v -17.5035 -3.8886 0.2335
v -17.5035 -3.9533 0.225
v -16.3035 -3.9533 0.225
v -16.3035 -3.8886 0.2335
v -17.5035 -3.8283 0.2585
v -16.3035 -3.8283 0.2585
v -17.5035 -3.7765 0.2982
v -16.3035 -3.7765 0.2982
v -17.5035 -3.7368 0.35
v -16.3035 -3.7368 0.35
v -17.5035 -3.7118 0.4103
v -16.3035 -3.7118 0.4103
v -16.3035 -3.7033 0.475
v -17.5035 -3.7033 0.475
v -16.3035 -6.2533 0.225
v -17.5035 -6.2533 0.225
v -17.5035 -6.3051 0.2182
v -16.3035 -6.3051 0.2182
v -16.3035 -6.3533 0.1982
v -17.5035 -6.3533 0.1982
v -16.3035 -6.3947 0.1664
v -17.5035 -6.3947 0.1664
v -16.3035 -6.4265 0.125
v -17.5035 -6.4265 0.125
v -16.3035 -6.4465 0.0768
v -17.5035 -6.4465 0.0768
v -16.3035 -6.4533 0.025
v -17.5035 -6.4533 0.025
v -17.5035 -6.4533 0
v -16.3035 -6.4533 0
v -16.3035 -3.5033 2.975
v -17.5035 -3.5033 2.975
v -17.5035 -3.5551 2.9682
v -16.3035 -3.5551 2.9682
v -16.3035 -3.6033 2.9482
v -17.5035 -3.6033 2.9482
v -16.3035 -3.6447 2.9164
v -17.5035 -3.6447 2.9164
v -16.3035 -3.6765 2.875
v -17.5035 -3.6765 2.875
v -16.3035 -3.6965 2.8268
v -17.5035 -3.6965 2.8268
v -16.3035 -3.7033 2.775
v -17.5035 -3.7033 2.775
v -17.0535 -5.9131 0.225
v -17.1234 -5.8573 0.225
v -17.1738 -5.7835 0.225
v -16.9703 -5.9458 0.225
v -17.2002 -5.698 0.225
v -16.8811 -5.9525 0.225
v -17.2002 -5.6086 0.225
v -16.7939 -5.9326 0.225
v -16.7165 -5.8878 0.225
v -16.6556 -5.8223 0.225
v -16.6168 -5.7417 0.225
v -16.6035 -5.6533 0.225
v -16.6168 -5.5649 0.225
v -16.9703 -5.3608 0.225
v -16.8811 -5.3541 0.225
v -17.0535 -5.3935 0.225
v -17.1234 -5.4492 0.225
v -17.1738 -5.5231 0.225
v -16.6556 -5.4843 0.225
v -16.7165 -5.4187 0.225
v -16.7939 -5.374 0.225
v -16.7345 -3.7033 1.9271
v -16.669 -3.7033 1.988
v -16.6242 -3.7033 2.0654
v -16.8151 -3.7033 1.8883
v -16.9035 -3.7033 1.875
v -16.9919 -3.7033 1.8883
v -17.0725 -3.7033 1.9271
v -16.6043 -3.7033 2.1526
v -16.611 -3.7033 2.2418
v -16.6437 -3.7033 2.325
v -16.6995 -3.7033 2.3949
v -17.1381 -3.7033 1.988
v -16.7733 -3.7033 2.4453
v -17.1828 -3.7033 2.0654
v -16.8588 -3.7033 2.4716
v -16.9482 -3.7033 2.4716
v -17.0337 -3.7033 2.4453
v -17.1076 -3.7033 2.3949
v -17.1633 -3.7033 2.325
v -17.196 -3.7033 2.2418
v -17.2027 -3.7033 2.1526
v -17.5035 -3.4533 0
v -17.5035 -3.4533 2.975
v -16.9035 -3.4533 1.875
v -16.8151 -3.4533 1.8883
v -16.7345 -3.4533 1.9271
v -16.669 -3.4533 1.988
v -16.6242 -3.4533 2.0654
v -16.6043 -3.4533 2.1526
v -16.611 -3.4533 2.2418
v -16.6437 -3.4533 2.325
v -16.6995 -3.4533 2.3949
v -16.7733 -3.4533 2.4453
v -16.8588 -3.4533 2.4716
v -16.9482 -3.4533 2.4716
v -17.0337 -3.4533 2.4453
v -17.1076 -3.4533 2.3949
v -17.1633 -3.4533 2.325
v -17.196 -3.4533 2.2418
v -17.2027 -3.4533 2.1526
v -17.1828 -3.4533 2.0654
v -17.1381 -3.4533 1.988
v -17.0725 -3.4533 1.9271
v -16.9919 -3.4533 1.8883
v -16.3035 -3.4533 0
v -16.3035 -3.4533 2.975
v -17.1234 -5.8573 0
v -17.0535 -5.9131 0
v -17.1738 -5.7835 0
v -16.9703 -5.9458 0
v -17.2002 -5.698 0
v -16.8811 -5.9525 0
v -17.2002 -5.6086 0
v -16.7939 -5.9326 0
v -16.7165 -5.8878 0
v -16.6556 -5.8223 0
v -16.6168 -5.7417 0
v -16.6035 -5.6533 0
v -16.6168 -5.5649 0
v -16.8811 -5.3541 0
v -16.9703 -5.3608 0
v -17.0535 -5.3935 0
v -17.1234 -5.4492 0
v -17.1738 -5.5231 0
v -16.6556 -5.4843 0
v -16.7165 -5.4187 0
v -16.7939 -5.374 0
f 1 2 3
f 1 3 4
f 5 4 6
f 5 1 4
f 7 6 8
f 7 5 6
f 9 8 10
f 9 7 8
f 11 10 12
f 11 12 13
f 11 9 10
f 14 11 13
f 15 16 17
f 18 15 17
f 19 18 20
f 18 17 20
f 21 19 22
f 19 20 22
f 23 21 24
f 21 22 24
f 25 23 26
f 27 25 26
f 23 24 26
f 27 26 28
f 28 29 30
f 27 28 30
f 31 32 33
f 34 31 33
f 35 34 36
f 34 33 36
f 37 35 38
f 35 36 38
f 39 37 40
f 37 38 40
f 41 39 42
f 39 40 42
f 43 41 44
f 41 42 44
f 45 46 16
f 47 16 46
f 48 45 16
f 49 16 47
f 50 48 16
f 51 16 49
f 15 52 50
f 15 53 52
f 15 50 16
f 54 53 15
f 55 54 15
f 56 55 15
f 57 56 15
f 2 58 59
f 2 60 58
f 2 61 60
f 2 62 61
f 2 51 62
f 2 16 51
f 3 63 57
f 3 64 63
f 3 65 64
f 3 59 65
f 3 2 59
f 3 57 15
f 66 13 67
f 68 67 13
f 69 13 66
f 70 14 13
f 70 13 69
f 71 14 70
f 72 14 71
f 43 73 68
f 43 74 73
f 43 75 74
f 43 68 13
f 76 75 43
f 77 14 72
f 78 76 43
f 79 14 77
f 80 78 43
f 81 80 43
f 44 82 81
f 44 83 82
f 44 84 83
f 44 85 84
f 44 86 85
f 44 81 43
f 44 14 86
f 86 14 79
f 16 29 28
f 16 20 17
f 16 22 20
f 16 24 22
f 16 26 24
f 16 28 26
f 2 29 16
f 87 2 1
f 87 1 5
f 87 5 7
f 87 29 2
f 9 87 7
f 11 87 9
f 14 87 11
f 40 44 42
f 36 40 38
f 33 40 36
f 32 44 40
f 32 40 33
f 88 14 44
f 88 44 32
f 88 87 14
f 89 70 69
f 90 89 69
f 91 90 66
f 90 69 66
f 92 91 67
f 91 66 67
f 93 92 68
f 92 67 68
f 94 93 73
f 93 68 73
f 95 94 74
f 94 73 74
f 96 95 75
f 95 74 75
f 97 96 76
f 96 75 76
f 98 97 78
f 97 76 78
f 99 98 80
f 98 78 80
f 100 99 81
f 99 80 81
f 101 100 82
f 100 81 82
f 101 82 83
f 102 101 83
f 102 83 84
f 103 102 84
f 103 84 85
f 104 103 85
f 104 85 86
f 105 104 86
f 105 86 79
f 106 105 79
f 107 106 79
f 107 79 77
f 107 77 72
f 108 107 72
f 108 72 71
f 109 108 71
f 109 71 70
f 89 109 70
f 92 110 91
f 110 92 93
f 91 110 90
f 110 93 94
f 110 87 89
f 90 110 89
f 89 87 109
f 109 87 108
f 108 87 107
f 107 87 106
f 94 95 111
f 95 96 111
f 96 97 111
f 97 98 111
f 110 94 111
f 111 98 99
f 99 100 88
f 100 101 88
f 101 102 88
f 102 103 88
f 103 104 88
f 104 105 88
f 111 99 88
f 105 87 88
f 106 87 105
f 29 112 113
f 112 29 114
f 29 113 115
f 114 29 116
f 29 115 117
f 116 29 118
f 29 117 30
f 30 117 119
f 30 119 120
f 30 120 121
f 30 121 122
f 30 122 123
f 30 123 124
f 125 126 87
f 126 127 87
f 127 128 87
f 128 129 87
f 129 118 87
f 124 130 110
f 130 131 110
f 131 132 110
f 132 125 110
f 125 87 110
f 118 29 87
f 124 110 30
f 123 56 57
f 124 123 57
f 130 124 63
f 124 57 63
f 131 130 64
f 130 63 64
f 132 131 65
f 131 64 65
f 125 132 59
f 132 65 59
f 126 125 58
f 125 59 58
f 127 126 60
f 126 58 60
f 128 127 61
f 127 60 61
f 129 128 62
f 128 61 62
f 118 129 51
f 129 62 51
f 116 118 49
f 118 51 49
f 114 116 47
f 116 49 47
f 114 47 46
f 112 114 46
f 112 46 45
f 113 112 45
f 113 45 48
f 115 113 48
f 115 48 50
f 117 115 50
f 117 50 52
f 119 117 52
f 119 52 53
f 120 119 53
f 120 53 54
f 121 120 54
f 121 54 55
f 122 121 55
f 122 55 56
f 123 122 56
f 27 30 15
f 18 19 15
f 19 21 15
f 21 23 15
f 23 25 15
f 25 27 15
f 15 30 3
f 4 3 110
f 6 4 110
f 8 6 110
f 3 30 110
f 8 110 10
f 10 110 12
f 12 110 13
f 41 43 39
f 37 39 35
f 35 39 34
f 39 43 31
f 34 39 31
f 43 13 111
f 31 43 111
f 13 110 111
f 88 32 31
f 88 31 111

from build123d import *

# Parameters (mm, degrees)
ESBO_O1_W                = 1.2
ESBO_O1_H                = 3
RESSALTO_EXTRUS_O1_DEPTH = 0.225
ESBO_O2_W                = 2.75
ESBO_O2_H                = 0.25
RESSALTO_EXTRUS_O2_DEPTH = 1.2
RESSALTO_EXTRUS_O3_DEPTH = 1.2
CORTE_EXTRUS_O1_DEPTH    = 1.2
ESBO_O8_R                = 0.3
CORTE_EXTRUS_O2_DEPTH    = 1.2
ESBO_O9_R                = 0.3
CORTE_EXTRUS_O3_DEPTH    = 1.2


with BuildPart() as part:
    # Esboço1 → Ressalto-extrusão1 (new body)
    with BuildSketch(Plane.XY):
        with Locations((-16.903502085, -4.953296555)):
            Rectangle(ESBO_O1_W, ESBO_O1_H)
    extrude(amount=RESSALTO_EXTRUS_O1_DEPTH)

    # Esboço2 → Ressalto-extrusão2 (add)
    with BuildSketch(Plane.ZY.offset(17.503502085)):
        with Locations((1.6, -3.578296555)):
            Rectangle(ESBO_O2_W, ESBO_O2_H)
    extrude(amount=-RESSALTO_EXTRUS_O2_DEPTH)

    # Esboço6 → Ressalto-extrusão3 (add)
    with BuildSketch(Plane.ZY.offset(17.503502085)):
        with BuildLine():
            Line((0.225, -3.703296555), (0.225, -3.953296555))
            ThreePointArc((0.225, -3.953296555), (0.298223305, -3.776519859), (0.475, -3.703296555))
            Line((0.475, -3.703296555), (0.225, -3.703296555))
        make_face()
    extrude(amount=-RESSALTO_EXTRUS_O3_DEPTH)

    # Esboço7 → Corte-extrusão1 (cut)
    with BuildSketch(Plane.ZY.offset(17.503502085)):
        with BuildLine():
            Line((2.975, -3.703296555), (2.975, -3.503296555))
            ThreePointArc((2.975, -3.503296555), (2.916421356, -3.644717911), (2.775, -3.703296555))
            Line((2.775, -3.703296555), (2.975, -3.703296555))
        make_face()
        with BuildLine():
            ThreePointArc((0.225, -6.253296555), (0.166421356, -6.394717911), (0.025, -6.453296555))
            Line((0.025, -6.453296555), (0.225, -6.453296555))
            Line((0.225, -6.453296555), (0.225, -6.253296555))
        make_face()
    extrude(amount=-CORTE_EXTRUS_O1_DEPTH, mode=Mode.SUBTRACT)

    # Esboço8 → Corte-extrusão2 (cut)
    with BuildSketch(Plane.XY.offset(0.225)):
        with Locations((-16.903502085, -5.653296555)):
            Circle(ESBO_O8_R)
    extrude(amount=-CORTE_EXTRUS_O2_DEPTH, mode=Mode.SUBTRACT)

    # Esboço9 → Corte-extrusão3 (cut)
    with BuildSketch(Plane.XZ.offset(3.703296555)):
        with Locations(Location((-16.903502085, 2.175, 0), (0, 0, 270))):
            Circle(ESBO_O9_R)
    extrude(amount=-CORTE_EXTRUS_O3_DEPTH, mode=Mode.SUBTRACT)


solid = part.part
